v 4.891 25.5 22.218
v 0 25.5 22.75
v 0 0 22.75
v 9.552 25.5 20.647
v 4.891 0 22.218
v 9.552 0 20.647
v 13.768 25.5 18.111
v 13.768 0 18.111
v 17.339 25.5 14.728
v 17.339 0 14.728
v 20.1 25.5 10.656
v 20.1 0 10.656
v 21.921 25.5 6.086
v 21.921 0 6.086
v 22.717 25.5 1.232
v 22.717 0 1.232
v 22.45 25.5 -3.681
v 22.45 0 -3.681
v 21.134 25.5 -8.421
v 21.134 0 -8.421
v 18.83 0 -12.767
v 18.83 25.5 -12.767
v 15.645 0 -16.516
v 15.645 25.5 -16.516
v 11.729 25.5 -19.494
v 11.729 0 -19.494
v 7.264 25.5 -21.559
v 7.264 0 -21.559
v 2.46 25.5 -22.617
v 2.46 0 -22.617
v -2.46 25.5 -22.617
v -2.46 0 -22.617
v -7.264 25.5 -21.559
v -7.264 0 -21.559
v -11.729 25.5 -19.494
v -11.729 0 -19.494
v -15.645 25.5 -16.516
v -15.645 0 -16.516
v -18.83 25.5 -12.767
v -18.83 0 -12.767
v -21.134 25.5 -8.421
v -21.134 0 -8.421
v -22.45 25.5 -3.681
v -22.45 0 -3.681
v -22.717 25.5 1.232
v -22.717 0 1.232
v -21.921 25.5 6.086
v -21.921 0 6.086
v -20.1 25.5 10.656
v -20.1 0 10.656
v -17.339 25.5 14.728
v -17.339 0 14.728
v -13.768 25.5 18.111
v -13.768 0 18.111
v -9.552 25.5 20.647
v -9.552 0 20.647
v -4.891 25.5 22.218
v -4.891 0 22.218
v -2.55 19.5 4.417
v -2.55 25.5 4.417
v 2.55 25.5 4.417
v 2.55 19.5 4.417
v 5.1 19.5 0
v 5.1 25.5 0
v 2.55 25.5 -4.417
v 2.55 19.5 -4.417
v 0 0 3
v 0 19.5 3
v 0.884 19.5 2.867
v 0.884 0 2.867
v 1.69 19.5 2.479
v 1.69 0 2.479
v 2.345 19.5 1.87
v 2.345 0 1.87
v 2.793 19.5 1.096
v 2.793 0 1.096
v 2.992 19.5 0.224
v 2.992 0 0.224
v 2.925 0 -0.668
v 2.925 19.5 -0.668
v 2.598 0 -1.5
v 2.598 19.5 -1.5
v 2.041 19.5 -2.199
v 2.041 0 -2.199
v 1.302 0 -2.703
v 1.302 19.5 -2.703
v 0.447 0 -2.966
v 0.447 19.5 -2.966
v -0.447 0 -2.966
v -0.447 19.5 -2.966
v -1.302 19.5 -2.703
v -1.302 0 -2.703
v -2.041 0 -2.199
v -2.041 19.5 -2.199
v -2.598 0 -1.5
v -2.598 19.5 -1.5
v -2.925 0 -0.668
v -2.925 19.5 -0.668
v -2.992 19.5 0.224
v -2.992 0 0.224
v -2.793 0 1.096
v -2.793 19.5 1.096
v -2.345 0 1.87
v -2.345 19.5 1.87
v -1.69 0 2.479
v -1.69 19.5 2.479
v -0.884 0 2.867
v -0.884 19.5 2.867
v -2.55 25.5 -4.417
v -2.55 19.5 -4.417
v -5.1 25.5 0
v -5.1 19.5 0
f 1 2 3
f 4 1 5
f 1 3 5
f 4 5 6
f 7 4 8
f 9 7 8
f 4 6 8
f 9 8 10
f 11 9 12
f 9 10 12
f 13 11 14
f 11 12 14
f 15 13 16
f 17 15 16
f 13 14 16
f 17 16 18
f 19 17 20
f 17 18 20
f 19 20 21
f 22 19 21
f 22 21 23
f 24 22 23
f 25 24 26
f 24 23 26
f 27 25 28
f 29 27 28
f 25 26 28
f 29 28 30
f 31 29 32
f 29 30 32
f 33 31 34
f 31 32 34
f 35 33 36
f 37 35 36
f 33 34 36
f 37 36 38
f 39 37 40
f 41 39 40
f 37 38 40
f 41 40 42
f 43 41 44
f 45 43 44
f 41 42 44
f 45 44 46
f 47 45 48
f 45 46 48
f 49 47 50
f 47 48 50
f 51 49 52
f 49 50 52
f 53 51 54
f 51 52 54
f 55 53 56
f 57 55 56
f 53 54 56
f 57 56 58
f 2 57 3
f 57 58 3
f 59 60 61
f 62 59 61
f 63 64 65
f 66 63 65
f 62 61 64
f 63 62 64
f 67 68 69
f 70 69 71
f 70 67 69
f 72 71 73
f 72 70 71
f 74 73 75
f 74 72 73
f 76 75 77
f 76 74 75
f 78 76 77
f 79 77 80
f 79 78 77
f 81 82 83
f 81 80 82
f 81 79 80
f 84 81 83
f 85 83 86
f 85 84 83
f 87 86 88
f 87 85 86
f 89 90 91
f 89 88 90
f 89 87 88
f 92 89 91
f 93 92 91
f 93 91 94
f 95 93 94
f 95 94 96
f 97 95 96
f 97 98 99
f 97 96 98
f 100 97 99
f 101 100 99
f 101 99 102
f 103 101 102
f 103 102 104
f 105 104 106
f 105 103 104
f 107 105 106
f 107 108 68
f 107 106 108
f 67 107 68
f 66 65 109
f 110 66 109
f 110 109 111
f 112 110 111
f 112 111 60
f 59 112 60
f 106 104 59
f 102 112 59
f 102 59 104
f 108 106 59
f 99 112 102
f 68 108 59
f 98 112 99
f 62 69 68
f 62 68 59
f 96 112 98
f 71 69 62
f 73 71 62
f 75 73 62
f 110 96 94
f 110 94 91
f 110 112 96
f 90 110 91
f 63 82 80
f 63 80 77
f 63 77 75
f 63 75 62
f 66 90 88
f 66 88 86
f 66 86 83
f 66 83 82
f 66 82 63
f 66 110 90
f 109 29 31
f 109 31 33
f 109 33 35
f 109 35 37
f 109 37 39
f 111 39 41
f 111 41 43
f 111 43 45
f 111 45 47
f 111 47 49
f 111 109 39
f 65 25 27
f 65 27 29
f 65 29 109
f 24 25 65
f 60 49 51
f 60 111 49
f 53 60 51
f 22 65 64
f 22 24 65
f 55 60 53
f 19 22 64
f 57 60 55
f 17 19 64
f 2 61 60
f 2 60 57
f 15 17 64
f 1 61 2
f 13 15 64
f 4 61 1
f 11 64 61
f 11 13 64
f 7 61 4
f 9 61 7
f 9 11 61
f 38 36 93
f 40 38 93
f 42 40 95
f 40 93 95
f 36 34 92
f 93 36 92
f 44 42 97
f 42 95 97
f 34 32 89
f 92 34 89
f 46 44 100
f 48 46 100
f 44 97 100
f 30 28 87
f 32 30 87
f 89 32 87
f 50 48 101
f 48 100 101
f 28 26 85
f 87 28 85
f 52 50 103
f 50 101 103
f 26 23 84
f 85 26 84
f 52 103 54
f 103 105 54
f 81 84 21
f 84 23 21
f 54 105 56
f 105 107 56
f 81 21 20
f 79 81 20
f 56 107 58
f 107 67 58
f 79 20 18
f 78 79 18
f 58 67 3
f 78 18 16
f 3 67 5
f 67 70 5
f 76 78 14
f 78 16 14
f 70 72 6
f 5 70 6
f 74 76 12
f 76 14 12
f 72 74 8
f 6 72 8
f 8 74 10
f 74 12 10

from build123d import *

# Parameters (mm, degrees)
SKETCH1_R           = 22.75
SKETCH1_R_2         = 3
BOSS_EXTRUDE1_DEPTH = 25.5
CUT_EXTRUDE1_DEPTH  = 6


with BuildPart() as part:
    # Sketch1 → Boss-Extrude1 (new body)
    with BuildSketch(Plane(origin=(0, 0, 0), x_dir=(1, 0, 0), z_dir=(0, 1, 0))):
        with Locations(Location((0, 0, 0), (0, 0, 270))):
            Circle(SKETCH1_R)
        with Locations(Location((0, 0, 0), (0, 0, 270))):
            Circle(SKETCH1_R_2, mode=Mode.SUBTRACT)
    extrude(amount=BOSS_EXTRUDE1_DEPTH)

    # Sketch2 → Cut-Extrude1 (cut)
    with BuildSketch(Plane(origin=(0, 25.5, 0), x_dir=(1, 0, 0), z_dir=(0, 1, 0))):
        Polygon((5.1, 0), (2.55, 4.416729559), (-2.55, 4.416729559), (-5.1, 0), (-2.55, -4.416729559), (2.55, -4.416729559), align=None)
    extrude(amount=-CUT_EXTRUDE1_DEPTH, mode=Mode.SUBTRACT)


solid = part.part
